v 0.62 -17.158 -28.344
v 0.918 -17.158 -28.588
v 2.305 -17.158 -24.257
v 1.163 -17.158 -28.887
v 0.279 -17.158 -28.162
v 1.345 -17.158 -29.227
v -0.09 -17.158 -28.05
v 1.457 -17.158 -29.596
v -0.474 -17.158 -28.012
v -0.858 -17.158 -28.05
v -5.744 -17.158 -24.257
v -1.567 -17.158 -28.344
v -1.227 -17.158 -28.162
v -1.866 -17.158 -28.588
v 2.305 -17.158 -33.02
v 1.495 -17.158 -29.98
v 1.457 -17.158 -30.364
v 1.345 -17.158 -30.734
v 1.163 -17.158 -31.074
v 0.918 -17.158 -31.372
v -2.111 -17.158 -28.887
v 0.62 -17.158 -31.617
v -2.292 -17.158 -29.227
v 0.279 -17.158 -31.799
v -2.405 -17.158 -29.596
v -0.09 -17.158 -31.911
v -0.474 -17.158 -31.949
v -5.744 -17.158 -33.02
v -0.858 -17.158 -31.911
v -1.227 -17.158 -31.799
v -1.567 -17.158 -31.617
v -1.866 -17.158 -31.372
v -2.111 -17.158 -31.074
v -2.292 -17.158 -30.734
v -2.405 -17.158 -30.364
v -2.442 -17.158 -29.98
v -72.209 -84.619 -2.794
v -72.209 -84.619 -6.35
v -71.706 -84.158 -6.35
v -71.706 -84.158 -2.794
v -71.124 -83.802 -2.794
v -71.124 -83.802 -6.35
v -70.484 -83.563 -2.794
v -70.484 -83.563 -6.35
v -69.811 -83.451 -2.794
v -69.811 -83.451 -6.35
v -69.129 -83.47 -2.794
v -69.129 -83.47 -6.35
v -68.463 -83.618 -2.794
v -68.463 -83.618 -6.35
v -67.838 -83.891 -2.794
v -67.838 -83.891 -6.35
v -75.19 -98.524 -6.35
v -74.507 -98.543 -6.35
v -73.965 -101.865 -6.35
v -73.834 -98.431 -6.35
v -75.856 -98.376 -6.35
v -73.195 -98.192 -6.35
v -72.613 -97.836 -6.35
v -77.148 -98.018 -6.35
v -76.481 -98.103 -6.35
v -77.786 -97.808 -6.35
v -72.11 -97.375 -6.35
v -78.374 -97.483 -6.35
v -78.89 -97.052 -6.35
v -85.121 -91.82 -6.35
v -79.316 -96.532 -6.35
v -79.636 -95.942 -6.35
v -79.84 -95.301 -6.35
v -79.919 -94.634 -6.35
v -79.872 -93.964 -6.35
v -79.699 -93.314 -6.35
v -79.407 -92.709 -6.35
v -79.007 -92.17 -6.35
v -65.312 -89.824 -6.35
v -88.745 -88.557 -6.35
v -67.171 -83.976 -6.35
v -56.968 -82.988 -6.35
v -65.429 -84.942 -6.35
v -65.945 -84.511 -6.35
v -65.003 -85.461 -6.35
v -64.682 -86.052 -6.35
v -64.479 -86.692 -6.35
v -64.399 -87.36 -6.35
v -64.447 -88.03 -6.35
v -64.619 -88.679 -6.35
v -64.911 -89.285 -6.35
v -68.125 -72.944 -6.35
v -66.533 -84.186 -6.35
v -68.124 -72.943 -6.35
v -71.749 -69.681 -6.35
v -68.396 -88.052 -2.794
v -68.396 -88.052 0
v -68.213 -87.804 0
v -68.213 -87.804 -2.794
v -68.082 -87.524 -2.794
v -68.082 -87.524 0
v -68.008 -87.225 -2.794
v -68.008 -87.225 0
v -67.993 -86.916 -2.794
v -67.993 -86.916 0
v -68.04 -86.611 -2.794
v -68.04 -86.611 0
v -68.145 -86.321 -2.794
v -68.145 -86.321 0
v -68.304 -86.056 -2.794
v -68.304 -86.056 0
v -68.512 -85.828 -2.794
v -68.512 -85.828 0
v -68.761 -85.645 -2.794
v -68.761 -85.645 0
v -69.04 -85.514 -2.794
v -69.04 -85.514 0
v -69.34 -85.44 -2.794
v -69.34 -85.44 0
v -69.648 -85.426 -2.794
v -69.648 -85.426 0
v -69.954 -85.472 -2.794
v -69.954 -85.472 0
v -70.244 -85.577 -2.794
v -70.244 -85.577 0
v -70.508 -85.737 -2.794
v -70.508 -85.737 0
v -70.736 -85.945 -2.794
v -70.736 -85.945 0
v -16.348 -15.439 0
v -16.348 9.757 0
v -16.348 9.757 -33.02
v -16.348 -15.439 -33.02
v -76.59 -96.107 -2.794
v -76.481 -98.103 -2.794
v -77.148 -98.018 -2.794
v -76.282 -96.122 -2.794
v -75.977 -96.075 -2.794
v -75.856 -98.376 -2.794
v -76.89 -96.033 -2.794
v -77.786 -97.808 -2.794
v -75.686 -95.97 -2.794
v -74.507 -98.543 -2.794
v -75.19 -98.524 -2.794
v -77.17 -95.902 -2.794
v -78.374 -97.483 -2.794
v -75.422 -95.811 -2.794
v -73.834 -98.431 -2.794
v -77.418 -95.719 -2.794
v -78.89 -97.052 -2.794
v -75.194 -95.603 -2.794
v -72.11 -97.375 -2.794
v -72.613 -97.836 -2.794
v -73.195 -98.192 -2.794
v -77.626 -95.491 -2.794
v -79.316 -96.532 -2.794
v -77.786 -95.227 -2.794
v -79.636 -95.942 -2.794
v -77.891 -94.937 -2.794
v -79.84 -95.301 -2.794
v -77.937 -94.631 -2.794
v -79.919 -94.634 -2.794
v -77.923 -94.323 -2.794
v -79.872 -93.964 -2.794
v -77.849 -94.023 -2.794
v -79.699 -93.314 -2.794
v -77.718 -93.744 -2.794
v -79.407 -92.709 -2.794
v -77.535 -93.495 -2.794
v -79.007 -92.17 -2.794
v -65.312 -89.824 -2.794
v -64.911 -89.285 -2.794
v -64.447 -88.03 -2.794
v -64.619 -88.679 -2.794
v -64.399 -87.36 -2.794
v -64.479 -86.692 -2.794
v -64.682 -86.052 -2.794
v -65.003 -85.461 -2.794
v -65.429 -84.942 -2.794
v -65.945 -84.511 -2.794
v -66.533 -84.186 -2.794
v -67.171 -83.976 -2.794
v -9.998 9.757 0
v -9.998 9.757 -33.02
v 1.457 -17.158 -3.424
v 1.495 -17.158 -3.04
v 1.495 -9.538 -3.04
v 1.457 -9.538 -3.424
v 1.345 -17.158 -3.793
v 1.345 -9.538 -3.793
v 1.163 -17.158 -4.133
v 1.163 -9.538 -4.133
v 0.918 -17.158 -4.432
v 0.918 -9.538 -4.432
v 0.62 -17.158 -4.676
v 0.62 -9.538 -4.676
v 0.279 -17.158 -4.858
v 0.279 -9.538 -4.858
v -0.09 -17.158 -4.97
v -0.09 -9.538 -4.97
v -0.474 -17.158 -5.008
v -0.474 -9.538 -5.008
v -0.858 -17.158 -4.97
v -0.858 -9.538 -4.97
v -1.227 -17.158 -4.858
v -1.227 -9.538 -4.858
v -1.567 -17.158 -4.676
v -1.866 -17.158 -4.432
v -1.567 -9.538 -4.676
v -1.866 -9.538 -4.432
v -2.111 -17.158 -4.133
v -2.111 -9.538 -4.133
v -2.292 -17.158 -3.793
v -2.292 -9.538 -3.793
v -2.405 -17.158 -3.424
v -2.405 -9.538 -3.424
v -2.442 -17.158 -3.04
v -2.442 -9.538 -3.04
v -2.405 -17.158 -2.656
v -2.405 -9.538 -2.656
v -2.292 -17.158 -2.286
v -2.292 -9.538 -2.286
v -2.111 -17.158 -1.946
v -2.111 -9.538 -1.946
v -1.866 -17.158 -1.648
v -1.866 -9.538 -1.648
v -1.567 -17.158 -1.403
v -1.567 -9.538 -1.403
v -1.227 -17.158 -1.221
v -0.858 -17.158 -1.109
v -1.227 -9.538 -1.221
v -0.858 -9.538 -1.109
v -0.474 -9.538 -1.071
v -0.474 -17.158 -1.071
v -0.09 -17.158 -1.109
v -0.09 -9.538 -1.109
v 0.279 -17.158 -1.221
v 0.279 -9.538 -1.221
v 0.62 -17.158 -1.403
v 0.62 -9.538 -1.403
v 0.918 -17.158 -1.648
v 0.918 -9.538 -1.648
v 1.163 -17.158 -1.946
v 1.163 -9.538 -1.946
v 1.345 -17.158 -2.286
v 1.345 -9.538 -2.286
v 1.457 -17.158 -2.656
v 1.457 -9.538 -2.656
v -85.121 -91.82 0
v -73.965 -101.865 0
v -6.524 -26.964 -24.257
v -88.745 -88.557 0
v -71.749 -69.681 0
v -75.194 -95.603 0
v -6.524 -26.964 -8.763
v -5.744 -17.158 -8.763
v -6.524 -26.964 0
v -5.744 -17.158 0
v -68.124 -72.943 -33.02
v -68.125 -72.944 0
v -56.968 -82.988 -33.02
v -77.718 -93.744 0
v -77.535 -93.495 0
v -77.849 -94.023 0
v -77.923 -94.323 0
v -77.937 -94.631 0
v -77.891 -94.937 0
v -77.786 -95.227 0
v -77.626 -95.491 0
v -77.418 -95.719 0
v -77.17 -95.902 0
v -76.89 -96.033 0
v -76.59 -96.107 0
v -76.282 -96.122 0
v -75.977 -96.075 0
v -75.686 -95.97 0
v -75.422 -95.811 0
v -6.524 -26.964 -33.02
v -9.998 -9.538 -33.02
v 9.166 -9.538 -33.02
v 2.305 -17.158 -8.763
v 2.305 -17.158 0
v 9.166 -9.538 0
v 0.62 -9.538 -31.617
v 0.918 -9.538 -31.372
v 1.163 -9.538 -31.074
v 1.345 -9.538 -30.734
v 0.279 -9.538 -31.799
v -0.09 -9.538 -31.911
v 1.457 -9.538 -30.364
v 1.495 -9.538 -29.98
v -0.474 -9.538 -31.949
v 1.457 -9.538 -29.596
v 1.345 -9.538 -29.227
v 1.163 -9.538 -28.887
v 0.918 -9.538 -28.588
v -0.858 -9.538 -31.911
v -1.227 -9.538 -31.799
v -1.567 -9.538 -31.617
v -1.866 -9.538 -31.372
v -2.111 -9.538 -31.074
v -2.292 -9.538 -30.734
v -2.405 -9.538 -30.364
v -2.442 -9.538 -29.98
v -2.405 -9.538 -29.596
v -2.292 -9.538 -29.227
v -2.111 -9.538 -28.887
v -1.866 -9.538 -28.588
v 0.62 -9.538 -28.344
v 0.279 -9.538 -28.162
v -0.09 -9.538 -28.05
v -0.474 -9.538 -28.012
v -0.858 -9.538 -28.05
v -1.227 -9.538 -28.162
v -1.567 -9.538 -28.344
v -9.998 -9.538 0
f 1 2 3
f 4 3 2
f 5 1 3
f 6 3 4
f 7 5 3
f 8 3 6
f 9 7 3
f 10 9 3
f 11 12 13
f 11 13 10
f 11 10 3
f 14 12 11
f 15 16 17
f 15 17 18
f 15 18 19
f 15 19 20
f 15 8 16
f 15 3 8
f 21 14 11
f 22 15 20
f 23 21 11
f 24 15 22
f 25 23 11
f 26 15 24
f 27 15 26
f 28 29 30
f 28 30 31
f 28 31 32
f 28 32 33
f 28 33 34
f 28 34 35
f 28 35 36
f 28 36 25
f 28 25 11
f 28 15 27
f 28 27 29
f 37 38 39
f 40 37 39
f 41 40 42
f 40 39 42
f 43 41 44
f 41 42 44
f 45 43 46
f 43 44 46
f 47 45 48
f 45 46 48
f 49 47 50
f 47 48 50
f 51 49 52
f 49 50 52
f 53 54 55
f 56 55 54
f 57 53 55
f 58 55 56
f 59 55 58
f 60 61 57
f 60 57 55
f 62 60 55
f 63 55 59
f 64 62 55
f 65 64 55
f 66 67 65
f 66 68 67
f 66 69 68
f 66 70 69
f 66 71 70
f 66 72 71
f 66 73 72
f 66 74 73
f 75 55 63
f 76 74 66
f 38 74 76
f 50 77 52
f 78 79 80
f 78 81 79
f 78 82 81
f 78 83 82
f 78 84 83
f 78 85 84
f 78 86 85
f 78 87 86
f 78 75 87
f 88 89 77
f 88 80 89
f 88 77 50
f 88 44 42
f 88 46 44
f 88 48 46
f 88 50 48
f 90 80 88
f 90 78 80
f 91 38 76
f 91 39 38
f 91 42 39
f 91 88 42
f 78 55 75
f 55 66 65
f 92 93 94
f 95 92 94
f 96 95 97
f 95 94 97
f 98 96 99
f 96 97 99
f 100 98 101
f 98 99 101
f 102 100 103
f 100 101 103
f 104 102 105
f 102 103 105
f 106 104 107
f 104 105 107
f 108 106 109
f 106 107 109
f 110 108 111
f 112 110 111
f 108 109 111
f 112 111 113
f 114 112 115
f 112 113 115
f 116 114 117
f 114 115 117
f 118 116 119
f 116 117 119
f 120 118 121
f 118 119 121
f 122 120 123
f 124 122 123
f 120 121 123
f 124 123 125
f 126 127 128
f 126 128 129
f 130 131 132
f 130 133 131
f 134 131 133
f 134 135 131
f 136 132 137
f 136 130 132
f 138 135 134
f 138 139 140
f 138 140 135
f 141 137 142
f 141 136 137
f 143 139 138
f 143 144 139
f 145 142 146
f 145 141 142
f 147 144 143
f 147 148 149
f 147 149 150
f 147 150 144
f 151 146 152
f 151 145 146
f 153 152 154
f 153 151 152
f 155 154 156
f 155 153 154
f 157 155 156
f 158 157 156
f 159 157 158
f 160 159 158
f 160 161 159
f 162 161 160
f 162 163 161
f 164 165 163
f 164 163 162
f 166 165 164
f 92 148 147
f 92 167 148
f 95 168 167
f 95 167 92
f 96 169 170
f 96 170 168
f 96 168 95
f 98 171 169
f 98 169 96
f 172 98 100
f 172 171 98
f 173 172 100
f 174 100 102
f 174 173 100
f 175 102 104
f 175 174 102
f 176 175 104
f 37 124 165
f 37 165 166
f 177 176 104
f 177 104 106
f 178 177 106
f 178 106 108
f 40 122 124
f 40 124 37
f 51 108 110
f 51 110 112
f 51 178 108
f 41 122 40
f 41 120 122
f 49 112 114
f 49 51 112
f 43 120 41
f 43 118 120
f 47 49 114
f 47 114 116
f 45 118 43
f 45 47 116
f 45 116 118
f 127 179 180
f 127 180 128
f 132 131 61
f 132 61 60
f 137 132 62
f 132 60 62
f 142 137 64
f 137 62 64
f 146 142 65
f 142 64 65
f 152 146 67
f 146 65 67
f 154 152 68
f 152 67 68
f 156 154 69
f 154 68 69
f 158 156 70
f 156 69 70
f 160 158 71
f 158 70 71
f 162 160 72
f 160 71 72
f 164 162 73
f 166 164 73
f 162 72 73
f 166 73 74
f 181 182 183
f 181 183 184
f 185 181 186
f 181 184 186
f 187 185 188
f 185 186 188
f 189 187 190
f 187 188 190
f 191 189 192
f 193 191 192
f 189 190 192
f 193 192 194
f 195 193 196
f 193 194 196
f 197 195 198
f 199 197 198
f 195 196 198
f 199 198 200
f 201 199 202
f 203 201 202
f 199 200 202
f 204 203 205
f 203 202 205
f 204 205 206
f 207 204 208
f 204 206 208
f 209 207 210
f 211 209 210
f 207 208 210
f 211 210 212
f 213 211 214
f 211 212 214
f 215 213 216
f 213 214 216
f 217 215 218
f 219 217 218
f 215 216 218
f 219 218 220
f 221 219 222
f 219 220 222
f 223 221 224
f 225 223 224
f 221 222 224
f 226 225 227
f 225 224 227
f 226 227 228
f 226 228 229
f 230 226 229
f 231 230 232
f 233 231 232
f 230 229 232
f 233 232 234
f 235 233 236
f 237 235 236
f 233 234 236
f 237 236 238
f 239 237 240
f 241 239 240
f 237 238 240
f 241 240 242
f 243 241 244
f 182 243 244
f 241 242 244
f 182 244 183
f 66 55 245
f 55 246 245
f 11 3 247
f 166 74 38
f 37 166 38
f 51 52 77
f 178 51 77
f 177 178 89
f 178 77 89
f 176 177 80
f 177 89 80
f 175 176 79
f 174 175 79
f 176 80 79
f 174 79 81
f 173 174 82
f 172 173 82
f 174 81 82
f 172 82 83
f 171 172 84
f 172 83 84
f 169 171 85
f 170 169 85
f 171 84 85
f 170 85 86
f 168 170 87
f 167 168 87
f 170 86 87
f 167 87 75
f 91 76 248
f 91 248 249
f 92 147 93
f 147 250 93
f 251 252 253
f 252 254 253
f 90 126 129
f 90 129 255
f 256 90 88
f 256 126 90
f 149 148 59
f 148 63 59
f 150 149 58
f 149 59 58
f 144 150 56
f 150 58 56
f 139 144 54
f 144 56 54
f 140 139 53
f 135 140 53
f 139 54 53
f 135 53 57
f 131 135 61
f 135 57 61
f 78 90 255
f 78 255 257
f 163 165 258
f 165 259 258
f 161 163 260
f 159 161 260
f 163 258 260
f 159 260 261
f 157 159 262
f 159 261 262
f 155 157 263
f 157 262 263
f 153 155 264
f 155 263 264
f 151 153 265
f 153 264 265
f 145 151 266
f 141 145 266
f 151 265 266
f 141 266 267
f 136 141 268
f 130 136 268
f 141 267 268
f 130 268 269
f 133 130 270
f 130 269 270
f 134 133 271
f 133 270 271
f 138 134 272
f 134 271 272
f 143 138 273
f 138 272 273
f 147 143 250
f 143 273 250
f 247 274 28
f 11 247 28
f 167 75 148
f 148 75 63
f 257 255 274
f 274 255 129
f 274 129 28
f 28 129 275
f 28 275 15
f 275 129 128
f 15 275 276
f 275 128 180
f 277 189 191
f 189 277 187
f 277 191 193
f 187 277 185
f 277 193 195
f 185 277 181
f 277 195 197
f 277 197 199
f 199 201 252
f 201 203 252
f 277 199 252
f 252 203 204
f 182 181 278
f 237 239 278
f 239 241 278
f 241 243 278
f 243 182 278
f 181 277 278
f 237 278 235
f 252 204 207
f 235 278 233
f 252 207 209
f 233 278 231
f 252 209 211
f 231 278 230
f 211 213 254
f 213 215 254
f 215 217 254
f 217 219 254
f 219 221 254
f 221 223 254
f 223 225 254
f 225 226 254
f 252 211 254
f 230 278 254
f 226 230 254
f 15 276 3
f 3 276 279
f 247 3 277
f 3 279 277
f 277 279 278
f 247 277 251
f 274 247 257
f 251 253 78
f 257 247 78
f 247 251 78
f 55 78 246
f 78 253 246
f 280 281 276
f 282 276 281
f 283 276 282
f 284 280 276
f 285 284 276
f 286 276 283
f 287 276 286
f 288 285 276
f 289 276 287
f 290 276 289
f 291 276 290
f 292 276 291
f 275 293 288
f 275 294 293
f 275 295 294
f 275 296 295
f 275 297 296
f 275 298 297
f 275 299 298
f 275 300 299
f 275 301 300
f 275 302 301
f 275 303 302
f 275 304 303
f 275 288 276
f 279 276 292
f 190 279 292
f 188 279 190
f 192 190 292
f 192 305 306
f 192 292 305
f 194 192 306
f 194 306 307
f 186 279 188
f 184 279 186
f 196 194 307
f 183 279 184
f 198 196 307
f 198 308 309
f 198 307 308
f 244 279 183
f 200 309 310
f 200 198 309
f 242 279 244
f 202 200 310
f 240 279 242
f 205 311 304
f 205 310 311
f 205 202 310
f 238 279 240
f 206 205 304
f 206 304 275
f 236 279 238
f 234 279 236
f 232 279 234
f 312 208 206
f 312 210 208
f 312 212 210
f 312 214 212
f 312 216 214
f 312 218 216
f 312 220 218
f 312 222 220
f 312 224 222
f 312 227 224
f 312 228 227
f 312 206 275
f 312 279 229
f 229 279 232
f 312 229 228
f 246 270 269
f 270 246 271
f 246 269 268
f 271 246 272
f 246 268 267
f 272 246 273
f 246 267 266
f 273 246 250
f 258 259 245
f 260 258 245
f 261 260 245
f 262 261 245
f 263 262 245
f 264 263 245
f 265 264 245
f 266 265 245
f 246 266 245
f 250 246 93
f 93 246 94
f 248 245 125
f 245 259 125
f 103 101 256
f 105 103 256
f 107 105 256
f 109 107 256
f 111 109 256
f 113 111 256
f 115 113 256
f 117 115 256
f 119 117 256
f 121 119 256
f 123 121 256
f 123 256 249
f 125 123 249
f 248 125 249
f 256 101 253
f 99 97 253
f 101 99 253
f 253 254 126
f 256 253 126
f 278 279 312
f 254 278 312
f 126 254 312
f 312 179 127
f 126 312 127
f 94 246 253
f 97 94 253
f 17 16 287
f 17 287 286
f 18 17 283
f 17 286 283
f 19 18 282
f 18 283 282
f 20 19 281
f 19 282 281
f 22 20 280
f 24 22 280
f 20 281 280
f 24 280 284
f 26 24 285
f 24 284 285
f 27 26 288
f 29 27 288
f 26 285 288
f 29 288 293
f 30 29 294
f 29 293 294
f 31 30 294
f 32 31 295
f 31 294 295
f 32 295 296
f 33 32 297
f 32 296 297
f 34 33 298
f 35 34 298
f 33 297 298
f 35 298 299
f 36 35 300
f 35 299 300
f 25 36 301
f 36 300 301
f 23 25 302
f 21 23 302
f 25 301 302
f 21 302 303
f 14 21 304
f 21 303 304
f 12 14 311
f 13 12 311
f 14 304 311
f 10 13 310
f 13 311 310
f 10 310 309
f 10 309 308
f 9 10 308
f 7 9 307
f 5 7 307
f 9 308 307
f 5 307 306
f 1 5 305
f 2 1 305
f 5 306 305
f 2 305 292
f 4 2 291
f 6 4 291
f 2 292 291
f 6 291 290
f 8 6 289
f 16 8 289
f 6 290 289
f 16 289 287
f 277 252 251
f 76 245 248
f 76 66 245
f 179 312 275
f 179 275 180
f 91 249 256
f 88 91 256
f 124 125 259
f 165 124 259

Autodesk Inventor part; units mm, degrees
ref_plane "YZ Plane" through (0, 0, 0) normal (1, 0, 0) x (0, 1, 0)
ref_plane "XZ Plane" through (0, 0, 0) normal (0, 1, 0) x (-1, 0, 0)
ref_plane "Work Plane1" through (0, 0, 0) normal (0, 0, 1) x (1, 0, 0)
sketch "Sketch1" plane through (0, 0, 0) normal (0, 0, 1) x (1, 0, 0)
  line L0 (4.129202, -9.5377) -> (6.406797, -9.5377) construction
  line L1 (9.525, -8.41296) -> (9.525, -7.435497) construction
  line L2 (-6.406797, 9.5123) -> (-4.129202, 9.5123) construction
  line L3 (-9.525, 4.116502) -> (-9.525, 6.394097) construction
  line L4 (9.314549, -9.373063) -> (-73.965447, -101.864868) construction
  line L5 (9.166309, -9.5377) -> (-73.965447, -101.864868)
  line L6 (-73.965447, -101.864868) -> (-85.121243, -91.820144)
  line L7 (6.33881, 9.756536) -> (-85.121243, -91.820144) construction
  line L8 (9.166309, -9.5377) -> (-9.997679, -9.5377)
  line L9 (-9.997679, -9.5377) -> (-9.997679, 9.756536)
  line L10 (-9.997679, 9.756536) -> (-16.347679, 9.756536)
  line L11 (-16.347679, 9.756536) -> (-16.347679, -15.439362)
  line L12 (-16.347679, -15.439362) -> (-85.121243, -91.820144)
  point P0 (0, 0)
  dimension "d0" = 124.46
  dimension "d1" = 48
  dimension "d5" = 6.35
ref_plane "Work Plane2" through (-4.445, -9.144, -33.02) normal (0, 0, -1) x (0, 1, 0)
extrude "Extrusion1" add sketch "Sketch1" against normal up to surface (33.02 mm away)
sketch "Sketch2" plane through (-73.965447, -101.864868, -33.02) normal (-0.6691306, -0.7431448, 0) x (0.7431448, -0.6691306, 0)
  line L0 (0, 33.02) -> (0, 0)
  line L1 (-15.011605, 33.02) -> (-15.011605, 0)
  line L2 (0, 0) -> (-15.011605, 0)
  line L3 (-15.011605, 0) -> (-15.011605, 26.67)
  line L4 (-15.011605, 26.67) -> (0, 26.67)
  line L5 (0, 26.67) -> (0, 0)
  line L6 (-15.011605, 33.02) -> (0, 33.02)
  point P0 (-13.193862, 33.02)
  dimension "d19" = 6.35
extrude "Extrusion2" cut sketch "Sketch2" against normal blind 25.4 contours L0 L2 L1 L4
sketch "Sketch3" plane through (-73.965447, -101.864868, -6.35) normal (0, 0, -1) x (-0.7431448, 0.6691306, 0)
  line L0 (19.8882, 12.0904) -> (19.8882, 3.175) construction
  line L1 (0, 25.4) -> (15.011605, 25.4) construction
  line L2 (15.011605, 0) -> (0, 0) construction
  line L3 (0, 0) -> (19.8882, 0) construction
  line L4 (19.8882, 0) -> (19.8882, 25.4) construction
  line L5 (19.8882, 25.4) -> (0, 25.4) construction
  line L6 (0, 25.4) -> (0, 0) construction
  line L7 (15.011605, 0) -> (19.8882, 0)
  line L8 (19.8882, 0) -> (19.8882, 25.4)
  line L9 (19.8882, 25.4) -> (15.011605, 25.4)
  line L10 (15.011605, 25.4) -> (15.011605, 0)
  point P0 (13.193862, 125.192894)
extrude "Extrusion3" add sketch "Sketch3" against normal up to surface (6.35 mm away)
sketch "Sketch4" plane through (0, 0, 0) normal (0, 0, 1) x (1, 0, 0)
  circle A0 centre (-72.965209, -90.773771) radius 1.1938 construction
  circle A1 centre (-65.459407, -96.637946) radius 1.1938 construction
  line L0 (-72.965209, -90.773771) -> (-64.699827, -81.594134) construction
  line L1 (-88.74526, -88.557064) -> (-71.749342, -69.681186) construction
  line L2 (-72.965209, -90.773771) -> (-77.668593, -95.997407) construction
  line L3 (-76.364393, -94.548947) -> (-69.566026, -86.998595) construction
  line L4 (-75.194088, -95.602693) -> (-68.395721, -88.052342)
  line L5 (-70.73633, -85.944848) -> (-77.534697, -93.4952)
  arc A2 (-77.534697, -93.4952) -> (-75.194088, -95.602693) centre (-76.364393, -94.548947) ccw
  arc A3 (-68.395721, -88.052342) -> (-70.73633, -85.944848) centre (-69.566026, -86.998595) ccw
  line L6 (-65.459407, -96.637946) -> (-57.773123, -88.101463) construction
  line L7 (-73.965447, -101.864868) -> (9.166309, -9.5377) construction
  line L8 (-65.459407, -96.637946) -> (-69.368096, -100.978985) construction
  line L9 (-68.85859, -100.413122) -> (-62.060223, -92.862771) construction
  line L10 (-67.688286, -101.466869) -> (-60.889919, -93.916518)
  line L11 (-63.230528, -91.809024) -> (-70.028895, -99.359375)
  arc A4 (-70.028895, -99.359375) -> (-67.688286, -101.466869) centre (-68.85859, -100.413122) ccw
  arc A5 (-60.889919, -93.916518) -> (-63.230528, -91.809024) centre (-62.060223, -92.862771) ccw
  point P0 (0, 0)
  dimension "d13" = 5.08
  dimension "d14" = 3.1496
  dimension "d15" = 5.08
  dimension "d16" = 3.1496
extrude "Extrusion4" cut sketch "Sketch4" against normal through all
sketch "Sketch5" plane through (-73.965447, -101.864868, -6.35) normal (0, 0, -1) x (-0.7431448, 0.6691306, 0)
  arc A0 (6.7564, 14.73835) -> (3.6068, 14.73835) centre (5.1816, 14.73835) ccw
  arc A1 (3.6068, 4.57835) -> (6.7564, 4.57835) centre (5.1816, 4.57835) ccw
  line L0 (5.1816, 14.73835) -> (5.1816, 4.57835) construction
  line L1 (1.6256, 14.73835) -> (1.6256, 4.57835)
  line L2 (8.7376, 4.57835) -> (8.7376, 14.73835)
  arc A2 (8.7376, 14.73835) -> (1.6256, 14.73835) centre (5.1816, 14.73835) ccw
  arc A3 (1.6256, 4.57835) -> (8.7376, 4.57835) centre (5.1816, 4.57835) ccw
  arc A4 (8.252871, 13.991581) -> (5.103271, 13.991581) centre (6.678071, 13.991581) ccw
  arc A5 (5.103271, 3.831581) -> (8.252871, 3.831581) centre (6.678071, 3.831581) ccw
  line L3 (6.678071, 13.991581) -> (6.678071, 3.831581) construction
  line L4 (3.122071, 13.991581) -> (3.122071, 3.831581)
  line L5 (10.234071, 3.831581) -> (10.234071, 13.991581)
  arc A6 (10.234071, 13.991581) -> (3.122071, 13.991581) centre (6.678071, 13.991581) ccw
  arc A7 (3.122071, 3.831581) -> (10.234071, 3.831581) centre (6.678071, 3.831581) ccw
  point P0 (13.193862, 125.192894)
  point P1 (5.1816, 9.65835)
  point P2 (6.678071, 8.911581)
  dimension "d20" = 7.112
  dimension "d21" = 7.112
sketch "Sketch5 outline for Extrusion5" plane through (-73.965447, -101.864868, -6.35) normal (0, 0, -1) x (-0.7431448, 0.6691306, 0)
  line L0 (10.234071, 3.831581) -> (10.234071, 13.991581)
  arc A0 (10.234071, 13.991581) -> (7.473106, 17.457566) centre (6.678071, 13.991581) ccw
  arc A1 (7.473106, 17.457566) -> (1.6256, 14.73835) centre (5.1816, 14.73835) ccw
  line L1 (1.6256, 14.73835) -> (1.6256, 4.57835)
  arc A2 (1.6256, 4.57835) -> (4.386565, 1.112364) centre (5.1816, 4.57835) ccw
  arc A3 (4.386565, 1.112364) -> (10.234071, 3.831581) centre (6.678071, 3.831581) ccw
extrude "Extrusion5" cut sketch "Sketch5 outline for Extrusion5" against normal blind 3.556
sketch "Sketch6" plane through (-9.997679, -9.5377, 0) normal (0, 1, 0) x (1, 0, 0)
  arc A0 (9.506526, 4.79213) -> (10.740649, 4.300966) centre (9.523849, 3.039616) ccw construction
  arc A1 (9.506526, 31.732899) -> (10.740649, 31.241734) centre (9.523849, 29.980384) ccw construction
  circle A2 centre (9.523849, 29.980384) radius 1.9685
  circle A3 centre (9.523849, 3.039616) radius 1.9685
  point P0 (9.997679, 0)
  dimension "d24" = 3.937
  dimension "d25" = 3.937
extrude "Extrusion6" cut sketch "Sketch6" against normal through all
sketch "Sketch7" plane through (9.166309, -9.5377, 0) normal (0.7431448, -0.6691306, 0) x (0, 0, -1)
  line L0 (33.02, -98.838459) -> (33.02, 0) construction
  line L1 (33.02, -9.525) -> (0, -9.525) construction
  point P0 (0, 0.954435)
sketch "Sketch8" plane through (9.166309, -9.5377, -33.02) normal (0, 0, -1) x (-1, 0, 0)
  line L0 (11.608639, 0) -> (11.608639, -12.892699) construction
  line L1 (66.135838, -73.451289) -> (0, 0) construction
  line L2 (11.608639, -7.62) -> (6.861079, -7.62) construction
  line L3 (0, 0) -> (19.163987, 0) construction
  line L4 (7.671639, 0) -> (7.671639, -8.520218) construction
  line L5 (14.910639, 0) -> (14.910639, -14.251905) construction
  line L6 (6.861079, -7.62) -> (14.910639, -7.62)
  line L7 (83.131755, -92.327168) -> (0, 0)
  line L8 (15.69062, -17.426199) -> (6.861079, -7.62)
  line L9 (15.69062, -17.426199) -> (14.910639, -7.62)
  point P0 (9.166309, 9.5377)
  dimension "d28" = 7.62
  dimension "d29" = 3.302
extrude "Extrusion7" cut sketch "Sketch8" against normal blind 8.763
sketch "Sketch9" plane through (0, 0, 0) normal (0, 0, 1) x (1, 0, 0)
  line L0 (2.30523, -17.1577) -> (-5.74433, -17.1577) construction
  line L1 (-5.74433, -17.1577) -> (-6.524312, -26.963899) construction
  line L2 (2.30523, -17.1577) -> (-6.524312, -26.963899)
  line L3 (-73.965447, -101.864868) -> (9.166309, -9.5377)
  line L4 (2.30523, -17.1577) -> (-5.74433, -17.1577)
  line L5 (-5.2705, -26.963899) -> (-5.2705, -17.1577)
  point P0 (0, 0)
sketch "Sketch9 outline for Extrusion8" plane through (0, 0, 0) normal (0, 0, 1) x (1, 0, 0)
  line L0 (-6.524312, -26.963899) -> (2.30523, -17.1577)
  line L1 (-5.74433, -17.1577) -> (-6.524312, -26.963899)
  line L2 (2.30523, -17.1577) -> (-5.74433, -17.1577)
extrude "Extrusion8" cut sketch "Sketch9 outline for Extrusion8" against normal blind 8.763
properties part number "arm stop"
